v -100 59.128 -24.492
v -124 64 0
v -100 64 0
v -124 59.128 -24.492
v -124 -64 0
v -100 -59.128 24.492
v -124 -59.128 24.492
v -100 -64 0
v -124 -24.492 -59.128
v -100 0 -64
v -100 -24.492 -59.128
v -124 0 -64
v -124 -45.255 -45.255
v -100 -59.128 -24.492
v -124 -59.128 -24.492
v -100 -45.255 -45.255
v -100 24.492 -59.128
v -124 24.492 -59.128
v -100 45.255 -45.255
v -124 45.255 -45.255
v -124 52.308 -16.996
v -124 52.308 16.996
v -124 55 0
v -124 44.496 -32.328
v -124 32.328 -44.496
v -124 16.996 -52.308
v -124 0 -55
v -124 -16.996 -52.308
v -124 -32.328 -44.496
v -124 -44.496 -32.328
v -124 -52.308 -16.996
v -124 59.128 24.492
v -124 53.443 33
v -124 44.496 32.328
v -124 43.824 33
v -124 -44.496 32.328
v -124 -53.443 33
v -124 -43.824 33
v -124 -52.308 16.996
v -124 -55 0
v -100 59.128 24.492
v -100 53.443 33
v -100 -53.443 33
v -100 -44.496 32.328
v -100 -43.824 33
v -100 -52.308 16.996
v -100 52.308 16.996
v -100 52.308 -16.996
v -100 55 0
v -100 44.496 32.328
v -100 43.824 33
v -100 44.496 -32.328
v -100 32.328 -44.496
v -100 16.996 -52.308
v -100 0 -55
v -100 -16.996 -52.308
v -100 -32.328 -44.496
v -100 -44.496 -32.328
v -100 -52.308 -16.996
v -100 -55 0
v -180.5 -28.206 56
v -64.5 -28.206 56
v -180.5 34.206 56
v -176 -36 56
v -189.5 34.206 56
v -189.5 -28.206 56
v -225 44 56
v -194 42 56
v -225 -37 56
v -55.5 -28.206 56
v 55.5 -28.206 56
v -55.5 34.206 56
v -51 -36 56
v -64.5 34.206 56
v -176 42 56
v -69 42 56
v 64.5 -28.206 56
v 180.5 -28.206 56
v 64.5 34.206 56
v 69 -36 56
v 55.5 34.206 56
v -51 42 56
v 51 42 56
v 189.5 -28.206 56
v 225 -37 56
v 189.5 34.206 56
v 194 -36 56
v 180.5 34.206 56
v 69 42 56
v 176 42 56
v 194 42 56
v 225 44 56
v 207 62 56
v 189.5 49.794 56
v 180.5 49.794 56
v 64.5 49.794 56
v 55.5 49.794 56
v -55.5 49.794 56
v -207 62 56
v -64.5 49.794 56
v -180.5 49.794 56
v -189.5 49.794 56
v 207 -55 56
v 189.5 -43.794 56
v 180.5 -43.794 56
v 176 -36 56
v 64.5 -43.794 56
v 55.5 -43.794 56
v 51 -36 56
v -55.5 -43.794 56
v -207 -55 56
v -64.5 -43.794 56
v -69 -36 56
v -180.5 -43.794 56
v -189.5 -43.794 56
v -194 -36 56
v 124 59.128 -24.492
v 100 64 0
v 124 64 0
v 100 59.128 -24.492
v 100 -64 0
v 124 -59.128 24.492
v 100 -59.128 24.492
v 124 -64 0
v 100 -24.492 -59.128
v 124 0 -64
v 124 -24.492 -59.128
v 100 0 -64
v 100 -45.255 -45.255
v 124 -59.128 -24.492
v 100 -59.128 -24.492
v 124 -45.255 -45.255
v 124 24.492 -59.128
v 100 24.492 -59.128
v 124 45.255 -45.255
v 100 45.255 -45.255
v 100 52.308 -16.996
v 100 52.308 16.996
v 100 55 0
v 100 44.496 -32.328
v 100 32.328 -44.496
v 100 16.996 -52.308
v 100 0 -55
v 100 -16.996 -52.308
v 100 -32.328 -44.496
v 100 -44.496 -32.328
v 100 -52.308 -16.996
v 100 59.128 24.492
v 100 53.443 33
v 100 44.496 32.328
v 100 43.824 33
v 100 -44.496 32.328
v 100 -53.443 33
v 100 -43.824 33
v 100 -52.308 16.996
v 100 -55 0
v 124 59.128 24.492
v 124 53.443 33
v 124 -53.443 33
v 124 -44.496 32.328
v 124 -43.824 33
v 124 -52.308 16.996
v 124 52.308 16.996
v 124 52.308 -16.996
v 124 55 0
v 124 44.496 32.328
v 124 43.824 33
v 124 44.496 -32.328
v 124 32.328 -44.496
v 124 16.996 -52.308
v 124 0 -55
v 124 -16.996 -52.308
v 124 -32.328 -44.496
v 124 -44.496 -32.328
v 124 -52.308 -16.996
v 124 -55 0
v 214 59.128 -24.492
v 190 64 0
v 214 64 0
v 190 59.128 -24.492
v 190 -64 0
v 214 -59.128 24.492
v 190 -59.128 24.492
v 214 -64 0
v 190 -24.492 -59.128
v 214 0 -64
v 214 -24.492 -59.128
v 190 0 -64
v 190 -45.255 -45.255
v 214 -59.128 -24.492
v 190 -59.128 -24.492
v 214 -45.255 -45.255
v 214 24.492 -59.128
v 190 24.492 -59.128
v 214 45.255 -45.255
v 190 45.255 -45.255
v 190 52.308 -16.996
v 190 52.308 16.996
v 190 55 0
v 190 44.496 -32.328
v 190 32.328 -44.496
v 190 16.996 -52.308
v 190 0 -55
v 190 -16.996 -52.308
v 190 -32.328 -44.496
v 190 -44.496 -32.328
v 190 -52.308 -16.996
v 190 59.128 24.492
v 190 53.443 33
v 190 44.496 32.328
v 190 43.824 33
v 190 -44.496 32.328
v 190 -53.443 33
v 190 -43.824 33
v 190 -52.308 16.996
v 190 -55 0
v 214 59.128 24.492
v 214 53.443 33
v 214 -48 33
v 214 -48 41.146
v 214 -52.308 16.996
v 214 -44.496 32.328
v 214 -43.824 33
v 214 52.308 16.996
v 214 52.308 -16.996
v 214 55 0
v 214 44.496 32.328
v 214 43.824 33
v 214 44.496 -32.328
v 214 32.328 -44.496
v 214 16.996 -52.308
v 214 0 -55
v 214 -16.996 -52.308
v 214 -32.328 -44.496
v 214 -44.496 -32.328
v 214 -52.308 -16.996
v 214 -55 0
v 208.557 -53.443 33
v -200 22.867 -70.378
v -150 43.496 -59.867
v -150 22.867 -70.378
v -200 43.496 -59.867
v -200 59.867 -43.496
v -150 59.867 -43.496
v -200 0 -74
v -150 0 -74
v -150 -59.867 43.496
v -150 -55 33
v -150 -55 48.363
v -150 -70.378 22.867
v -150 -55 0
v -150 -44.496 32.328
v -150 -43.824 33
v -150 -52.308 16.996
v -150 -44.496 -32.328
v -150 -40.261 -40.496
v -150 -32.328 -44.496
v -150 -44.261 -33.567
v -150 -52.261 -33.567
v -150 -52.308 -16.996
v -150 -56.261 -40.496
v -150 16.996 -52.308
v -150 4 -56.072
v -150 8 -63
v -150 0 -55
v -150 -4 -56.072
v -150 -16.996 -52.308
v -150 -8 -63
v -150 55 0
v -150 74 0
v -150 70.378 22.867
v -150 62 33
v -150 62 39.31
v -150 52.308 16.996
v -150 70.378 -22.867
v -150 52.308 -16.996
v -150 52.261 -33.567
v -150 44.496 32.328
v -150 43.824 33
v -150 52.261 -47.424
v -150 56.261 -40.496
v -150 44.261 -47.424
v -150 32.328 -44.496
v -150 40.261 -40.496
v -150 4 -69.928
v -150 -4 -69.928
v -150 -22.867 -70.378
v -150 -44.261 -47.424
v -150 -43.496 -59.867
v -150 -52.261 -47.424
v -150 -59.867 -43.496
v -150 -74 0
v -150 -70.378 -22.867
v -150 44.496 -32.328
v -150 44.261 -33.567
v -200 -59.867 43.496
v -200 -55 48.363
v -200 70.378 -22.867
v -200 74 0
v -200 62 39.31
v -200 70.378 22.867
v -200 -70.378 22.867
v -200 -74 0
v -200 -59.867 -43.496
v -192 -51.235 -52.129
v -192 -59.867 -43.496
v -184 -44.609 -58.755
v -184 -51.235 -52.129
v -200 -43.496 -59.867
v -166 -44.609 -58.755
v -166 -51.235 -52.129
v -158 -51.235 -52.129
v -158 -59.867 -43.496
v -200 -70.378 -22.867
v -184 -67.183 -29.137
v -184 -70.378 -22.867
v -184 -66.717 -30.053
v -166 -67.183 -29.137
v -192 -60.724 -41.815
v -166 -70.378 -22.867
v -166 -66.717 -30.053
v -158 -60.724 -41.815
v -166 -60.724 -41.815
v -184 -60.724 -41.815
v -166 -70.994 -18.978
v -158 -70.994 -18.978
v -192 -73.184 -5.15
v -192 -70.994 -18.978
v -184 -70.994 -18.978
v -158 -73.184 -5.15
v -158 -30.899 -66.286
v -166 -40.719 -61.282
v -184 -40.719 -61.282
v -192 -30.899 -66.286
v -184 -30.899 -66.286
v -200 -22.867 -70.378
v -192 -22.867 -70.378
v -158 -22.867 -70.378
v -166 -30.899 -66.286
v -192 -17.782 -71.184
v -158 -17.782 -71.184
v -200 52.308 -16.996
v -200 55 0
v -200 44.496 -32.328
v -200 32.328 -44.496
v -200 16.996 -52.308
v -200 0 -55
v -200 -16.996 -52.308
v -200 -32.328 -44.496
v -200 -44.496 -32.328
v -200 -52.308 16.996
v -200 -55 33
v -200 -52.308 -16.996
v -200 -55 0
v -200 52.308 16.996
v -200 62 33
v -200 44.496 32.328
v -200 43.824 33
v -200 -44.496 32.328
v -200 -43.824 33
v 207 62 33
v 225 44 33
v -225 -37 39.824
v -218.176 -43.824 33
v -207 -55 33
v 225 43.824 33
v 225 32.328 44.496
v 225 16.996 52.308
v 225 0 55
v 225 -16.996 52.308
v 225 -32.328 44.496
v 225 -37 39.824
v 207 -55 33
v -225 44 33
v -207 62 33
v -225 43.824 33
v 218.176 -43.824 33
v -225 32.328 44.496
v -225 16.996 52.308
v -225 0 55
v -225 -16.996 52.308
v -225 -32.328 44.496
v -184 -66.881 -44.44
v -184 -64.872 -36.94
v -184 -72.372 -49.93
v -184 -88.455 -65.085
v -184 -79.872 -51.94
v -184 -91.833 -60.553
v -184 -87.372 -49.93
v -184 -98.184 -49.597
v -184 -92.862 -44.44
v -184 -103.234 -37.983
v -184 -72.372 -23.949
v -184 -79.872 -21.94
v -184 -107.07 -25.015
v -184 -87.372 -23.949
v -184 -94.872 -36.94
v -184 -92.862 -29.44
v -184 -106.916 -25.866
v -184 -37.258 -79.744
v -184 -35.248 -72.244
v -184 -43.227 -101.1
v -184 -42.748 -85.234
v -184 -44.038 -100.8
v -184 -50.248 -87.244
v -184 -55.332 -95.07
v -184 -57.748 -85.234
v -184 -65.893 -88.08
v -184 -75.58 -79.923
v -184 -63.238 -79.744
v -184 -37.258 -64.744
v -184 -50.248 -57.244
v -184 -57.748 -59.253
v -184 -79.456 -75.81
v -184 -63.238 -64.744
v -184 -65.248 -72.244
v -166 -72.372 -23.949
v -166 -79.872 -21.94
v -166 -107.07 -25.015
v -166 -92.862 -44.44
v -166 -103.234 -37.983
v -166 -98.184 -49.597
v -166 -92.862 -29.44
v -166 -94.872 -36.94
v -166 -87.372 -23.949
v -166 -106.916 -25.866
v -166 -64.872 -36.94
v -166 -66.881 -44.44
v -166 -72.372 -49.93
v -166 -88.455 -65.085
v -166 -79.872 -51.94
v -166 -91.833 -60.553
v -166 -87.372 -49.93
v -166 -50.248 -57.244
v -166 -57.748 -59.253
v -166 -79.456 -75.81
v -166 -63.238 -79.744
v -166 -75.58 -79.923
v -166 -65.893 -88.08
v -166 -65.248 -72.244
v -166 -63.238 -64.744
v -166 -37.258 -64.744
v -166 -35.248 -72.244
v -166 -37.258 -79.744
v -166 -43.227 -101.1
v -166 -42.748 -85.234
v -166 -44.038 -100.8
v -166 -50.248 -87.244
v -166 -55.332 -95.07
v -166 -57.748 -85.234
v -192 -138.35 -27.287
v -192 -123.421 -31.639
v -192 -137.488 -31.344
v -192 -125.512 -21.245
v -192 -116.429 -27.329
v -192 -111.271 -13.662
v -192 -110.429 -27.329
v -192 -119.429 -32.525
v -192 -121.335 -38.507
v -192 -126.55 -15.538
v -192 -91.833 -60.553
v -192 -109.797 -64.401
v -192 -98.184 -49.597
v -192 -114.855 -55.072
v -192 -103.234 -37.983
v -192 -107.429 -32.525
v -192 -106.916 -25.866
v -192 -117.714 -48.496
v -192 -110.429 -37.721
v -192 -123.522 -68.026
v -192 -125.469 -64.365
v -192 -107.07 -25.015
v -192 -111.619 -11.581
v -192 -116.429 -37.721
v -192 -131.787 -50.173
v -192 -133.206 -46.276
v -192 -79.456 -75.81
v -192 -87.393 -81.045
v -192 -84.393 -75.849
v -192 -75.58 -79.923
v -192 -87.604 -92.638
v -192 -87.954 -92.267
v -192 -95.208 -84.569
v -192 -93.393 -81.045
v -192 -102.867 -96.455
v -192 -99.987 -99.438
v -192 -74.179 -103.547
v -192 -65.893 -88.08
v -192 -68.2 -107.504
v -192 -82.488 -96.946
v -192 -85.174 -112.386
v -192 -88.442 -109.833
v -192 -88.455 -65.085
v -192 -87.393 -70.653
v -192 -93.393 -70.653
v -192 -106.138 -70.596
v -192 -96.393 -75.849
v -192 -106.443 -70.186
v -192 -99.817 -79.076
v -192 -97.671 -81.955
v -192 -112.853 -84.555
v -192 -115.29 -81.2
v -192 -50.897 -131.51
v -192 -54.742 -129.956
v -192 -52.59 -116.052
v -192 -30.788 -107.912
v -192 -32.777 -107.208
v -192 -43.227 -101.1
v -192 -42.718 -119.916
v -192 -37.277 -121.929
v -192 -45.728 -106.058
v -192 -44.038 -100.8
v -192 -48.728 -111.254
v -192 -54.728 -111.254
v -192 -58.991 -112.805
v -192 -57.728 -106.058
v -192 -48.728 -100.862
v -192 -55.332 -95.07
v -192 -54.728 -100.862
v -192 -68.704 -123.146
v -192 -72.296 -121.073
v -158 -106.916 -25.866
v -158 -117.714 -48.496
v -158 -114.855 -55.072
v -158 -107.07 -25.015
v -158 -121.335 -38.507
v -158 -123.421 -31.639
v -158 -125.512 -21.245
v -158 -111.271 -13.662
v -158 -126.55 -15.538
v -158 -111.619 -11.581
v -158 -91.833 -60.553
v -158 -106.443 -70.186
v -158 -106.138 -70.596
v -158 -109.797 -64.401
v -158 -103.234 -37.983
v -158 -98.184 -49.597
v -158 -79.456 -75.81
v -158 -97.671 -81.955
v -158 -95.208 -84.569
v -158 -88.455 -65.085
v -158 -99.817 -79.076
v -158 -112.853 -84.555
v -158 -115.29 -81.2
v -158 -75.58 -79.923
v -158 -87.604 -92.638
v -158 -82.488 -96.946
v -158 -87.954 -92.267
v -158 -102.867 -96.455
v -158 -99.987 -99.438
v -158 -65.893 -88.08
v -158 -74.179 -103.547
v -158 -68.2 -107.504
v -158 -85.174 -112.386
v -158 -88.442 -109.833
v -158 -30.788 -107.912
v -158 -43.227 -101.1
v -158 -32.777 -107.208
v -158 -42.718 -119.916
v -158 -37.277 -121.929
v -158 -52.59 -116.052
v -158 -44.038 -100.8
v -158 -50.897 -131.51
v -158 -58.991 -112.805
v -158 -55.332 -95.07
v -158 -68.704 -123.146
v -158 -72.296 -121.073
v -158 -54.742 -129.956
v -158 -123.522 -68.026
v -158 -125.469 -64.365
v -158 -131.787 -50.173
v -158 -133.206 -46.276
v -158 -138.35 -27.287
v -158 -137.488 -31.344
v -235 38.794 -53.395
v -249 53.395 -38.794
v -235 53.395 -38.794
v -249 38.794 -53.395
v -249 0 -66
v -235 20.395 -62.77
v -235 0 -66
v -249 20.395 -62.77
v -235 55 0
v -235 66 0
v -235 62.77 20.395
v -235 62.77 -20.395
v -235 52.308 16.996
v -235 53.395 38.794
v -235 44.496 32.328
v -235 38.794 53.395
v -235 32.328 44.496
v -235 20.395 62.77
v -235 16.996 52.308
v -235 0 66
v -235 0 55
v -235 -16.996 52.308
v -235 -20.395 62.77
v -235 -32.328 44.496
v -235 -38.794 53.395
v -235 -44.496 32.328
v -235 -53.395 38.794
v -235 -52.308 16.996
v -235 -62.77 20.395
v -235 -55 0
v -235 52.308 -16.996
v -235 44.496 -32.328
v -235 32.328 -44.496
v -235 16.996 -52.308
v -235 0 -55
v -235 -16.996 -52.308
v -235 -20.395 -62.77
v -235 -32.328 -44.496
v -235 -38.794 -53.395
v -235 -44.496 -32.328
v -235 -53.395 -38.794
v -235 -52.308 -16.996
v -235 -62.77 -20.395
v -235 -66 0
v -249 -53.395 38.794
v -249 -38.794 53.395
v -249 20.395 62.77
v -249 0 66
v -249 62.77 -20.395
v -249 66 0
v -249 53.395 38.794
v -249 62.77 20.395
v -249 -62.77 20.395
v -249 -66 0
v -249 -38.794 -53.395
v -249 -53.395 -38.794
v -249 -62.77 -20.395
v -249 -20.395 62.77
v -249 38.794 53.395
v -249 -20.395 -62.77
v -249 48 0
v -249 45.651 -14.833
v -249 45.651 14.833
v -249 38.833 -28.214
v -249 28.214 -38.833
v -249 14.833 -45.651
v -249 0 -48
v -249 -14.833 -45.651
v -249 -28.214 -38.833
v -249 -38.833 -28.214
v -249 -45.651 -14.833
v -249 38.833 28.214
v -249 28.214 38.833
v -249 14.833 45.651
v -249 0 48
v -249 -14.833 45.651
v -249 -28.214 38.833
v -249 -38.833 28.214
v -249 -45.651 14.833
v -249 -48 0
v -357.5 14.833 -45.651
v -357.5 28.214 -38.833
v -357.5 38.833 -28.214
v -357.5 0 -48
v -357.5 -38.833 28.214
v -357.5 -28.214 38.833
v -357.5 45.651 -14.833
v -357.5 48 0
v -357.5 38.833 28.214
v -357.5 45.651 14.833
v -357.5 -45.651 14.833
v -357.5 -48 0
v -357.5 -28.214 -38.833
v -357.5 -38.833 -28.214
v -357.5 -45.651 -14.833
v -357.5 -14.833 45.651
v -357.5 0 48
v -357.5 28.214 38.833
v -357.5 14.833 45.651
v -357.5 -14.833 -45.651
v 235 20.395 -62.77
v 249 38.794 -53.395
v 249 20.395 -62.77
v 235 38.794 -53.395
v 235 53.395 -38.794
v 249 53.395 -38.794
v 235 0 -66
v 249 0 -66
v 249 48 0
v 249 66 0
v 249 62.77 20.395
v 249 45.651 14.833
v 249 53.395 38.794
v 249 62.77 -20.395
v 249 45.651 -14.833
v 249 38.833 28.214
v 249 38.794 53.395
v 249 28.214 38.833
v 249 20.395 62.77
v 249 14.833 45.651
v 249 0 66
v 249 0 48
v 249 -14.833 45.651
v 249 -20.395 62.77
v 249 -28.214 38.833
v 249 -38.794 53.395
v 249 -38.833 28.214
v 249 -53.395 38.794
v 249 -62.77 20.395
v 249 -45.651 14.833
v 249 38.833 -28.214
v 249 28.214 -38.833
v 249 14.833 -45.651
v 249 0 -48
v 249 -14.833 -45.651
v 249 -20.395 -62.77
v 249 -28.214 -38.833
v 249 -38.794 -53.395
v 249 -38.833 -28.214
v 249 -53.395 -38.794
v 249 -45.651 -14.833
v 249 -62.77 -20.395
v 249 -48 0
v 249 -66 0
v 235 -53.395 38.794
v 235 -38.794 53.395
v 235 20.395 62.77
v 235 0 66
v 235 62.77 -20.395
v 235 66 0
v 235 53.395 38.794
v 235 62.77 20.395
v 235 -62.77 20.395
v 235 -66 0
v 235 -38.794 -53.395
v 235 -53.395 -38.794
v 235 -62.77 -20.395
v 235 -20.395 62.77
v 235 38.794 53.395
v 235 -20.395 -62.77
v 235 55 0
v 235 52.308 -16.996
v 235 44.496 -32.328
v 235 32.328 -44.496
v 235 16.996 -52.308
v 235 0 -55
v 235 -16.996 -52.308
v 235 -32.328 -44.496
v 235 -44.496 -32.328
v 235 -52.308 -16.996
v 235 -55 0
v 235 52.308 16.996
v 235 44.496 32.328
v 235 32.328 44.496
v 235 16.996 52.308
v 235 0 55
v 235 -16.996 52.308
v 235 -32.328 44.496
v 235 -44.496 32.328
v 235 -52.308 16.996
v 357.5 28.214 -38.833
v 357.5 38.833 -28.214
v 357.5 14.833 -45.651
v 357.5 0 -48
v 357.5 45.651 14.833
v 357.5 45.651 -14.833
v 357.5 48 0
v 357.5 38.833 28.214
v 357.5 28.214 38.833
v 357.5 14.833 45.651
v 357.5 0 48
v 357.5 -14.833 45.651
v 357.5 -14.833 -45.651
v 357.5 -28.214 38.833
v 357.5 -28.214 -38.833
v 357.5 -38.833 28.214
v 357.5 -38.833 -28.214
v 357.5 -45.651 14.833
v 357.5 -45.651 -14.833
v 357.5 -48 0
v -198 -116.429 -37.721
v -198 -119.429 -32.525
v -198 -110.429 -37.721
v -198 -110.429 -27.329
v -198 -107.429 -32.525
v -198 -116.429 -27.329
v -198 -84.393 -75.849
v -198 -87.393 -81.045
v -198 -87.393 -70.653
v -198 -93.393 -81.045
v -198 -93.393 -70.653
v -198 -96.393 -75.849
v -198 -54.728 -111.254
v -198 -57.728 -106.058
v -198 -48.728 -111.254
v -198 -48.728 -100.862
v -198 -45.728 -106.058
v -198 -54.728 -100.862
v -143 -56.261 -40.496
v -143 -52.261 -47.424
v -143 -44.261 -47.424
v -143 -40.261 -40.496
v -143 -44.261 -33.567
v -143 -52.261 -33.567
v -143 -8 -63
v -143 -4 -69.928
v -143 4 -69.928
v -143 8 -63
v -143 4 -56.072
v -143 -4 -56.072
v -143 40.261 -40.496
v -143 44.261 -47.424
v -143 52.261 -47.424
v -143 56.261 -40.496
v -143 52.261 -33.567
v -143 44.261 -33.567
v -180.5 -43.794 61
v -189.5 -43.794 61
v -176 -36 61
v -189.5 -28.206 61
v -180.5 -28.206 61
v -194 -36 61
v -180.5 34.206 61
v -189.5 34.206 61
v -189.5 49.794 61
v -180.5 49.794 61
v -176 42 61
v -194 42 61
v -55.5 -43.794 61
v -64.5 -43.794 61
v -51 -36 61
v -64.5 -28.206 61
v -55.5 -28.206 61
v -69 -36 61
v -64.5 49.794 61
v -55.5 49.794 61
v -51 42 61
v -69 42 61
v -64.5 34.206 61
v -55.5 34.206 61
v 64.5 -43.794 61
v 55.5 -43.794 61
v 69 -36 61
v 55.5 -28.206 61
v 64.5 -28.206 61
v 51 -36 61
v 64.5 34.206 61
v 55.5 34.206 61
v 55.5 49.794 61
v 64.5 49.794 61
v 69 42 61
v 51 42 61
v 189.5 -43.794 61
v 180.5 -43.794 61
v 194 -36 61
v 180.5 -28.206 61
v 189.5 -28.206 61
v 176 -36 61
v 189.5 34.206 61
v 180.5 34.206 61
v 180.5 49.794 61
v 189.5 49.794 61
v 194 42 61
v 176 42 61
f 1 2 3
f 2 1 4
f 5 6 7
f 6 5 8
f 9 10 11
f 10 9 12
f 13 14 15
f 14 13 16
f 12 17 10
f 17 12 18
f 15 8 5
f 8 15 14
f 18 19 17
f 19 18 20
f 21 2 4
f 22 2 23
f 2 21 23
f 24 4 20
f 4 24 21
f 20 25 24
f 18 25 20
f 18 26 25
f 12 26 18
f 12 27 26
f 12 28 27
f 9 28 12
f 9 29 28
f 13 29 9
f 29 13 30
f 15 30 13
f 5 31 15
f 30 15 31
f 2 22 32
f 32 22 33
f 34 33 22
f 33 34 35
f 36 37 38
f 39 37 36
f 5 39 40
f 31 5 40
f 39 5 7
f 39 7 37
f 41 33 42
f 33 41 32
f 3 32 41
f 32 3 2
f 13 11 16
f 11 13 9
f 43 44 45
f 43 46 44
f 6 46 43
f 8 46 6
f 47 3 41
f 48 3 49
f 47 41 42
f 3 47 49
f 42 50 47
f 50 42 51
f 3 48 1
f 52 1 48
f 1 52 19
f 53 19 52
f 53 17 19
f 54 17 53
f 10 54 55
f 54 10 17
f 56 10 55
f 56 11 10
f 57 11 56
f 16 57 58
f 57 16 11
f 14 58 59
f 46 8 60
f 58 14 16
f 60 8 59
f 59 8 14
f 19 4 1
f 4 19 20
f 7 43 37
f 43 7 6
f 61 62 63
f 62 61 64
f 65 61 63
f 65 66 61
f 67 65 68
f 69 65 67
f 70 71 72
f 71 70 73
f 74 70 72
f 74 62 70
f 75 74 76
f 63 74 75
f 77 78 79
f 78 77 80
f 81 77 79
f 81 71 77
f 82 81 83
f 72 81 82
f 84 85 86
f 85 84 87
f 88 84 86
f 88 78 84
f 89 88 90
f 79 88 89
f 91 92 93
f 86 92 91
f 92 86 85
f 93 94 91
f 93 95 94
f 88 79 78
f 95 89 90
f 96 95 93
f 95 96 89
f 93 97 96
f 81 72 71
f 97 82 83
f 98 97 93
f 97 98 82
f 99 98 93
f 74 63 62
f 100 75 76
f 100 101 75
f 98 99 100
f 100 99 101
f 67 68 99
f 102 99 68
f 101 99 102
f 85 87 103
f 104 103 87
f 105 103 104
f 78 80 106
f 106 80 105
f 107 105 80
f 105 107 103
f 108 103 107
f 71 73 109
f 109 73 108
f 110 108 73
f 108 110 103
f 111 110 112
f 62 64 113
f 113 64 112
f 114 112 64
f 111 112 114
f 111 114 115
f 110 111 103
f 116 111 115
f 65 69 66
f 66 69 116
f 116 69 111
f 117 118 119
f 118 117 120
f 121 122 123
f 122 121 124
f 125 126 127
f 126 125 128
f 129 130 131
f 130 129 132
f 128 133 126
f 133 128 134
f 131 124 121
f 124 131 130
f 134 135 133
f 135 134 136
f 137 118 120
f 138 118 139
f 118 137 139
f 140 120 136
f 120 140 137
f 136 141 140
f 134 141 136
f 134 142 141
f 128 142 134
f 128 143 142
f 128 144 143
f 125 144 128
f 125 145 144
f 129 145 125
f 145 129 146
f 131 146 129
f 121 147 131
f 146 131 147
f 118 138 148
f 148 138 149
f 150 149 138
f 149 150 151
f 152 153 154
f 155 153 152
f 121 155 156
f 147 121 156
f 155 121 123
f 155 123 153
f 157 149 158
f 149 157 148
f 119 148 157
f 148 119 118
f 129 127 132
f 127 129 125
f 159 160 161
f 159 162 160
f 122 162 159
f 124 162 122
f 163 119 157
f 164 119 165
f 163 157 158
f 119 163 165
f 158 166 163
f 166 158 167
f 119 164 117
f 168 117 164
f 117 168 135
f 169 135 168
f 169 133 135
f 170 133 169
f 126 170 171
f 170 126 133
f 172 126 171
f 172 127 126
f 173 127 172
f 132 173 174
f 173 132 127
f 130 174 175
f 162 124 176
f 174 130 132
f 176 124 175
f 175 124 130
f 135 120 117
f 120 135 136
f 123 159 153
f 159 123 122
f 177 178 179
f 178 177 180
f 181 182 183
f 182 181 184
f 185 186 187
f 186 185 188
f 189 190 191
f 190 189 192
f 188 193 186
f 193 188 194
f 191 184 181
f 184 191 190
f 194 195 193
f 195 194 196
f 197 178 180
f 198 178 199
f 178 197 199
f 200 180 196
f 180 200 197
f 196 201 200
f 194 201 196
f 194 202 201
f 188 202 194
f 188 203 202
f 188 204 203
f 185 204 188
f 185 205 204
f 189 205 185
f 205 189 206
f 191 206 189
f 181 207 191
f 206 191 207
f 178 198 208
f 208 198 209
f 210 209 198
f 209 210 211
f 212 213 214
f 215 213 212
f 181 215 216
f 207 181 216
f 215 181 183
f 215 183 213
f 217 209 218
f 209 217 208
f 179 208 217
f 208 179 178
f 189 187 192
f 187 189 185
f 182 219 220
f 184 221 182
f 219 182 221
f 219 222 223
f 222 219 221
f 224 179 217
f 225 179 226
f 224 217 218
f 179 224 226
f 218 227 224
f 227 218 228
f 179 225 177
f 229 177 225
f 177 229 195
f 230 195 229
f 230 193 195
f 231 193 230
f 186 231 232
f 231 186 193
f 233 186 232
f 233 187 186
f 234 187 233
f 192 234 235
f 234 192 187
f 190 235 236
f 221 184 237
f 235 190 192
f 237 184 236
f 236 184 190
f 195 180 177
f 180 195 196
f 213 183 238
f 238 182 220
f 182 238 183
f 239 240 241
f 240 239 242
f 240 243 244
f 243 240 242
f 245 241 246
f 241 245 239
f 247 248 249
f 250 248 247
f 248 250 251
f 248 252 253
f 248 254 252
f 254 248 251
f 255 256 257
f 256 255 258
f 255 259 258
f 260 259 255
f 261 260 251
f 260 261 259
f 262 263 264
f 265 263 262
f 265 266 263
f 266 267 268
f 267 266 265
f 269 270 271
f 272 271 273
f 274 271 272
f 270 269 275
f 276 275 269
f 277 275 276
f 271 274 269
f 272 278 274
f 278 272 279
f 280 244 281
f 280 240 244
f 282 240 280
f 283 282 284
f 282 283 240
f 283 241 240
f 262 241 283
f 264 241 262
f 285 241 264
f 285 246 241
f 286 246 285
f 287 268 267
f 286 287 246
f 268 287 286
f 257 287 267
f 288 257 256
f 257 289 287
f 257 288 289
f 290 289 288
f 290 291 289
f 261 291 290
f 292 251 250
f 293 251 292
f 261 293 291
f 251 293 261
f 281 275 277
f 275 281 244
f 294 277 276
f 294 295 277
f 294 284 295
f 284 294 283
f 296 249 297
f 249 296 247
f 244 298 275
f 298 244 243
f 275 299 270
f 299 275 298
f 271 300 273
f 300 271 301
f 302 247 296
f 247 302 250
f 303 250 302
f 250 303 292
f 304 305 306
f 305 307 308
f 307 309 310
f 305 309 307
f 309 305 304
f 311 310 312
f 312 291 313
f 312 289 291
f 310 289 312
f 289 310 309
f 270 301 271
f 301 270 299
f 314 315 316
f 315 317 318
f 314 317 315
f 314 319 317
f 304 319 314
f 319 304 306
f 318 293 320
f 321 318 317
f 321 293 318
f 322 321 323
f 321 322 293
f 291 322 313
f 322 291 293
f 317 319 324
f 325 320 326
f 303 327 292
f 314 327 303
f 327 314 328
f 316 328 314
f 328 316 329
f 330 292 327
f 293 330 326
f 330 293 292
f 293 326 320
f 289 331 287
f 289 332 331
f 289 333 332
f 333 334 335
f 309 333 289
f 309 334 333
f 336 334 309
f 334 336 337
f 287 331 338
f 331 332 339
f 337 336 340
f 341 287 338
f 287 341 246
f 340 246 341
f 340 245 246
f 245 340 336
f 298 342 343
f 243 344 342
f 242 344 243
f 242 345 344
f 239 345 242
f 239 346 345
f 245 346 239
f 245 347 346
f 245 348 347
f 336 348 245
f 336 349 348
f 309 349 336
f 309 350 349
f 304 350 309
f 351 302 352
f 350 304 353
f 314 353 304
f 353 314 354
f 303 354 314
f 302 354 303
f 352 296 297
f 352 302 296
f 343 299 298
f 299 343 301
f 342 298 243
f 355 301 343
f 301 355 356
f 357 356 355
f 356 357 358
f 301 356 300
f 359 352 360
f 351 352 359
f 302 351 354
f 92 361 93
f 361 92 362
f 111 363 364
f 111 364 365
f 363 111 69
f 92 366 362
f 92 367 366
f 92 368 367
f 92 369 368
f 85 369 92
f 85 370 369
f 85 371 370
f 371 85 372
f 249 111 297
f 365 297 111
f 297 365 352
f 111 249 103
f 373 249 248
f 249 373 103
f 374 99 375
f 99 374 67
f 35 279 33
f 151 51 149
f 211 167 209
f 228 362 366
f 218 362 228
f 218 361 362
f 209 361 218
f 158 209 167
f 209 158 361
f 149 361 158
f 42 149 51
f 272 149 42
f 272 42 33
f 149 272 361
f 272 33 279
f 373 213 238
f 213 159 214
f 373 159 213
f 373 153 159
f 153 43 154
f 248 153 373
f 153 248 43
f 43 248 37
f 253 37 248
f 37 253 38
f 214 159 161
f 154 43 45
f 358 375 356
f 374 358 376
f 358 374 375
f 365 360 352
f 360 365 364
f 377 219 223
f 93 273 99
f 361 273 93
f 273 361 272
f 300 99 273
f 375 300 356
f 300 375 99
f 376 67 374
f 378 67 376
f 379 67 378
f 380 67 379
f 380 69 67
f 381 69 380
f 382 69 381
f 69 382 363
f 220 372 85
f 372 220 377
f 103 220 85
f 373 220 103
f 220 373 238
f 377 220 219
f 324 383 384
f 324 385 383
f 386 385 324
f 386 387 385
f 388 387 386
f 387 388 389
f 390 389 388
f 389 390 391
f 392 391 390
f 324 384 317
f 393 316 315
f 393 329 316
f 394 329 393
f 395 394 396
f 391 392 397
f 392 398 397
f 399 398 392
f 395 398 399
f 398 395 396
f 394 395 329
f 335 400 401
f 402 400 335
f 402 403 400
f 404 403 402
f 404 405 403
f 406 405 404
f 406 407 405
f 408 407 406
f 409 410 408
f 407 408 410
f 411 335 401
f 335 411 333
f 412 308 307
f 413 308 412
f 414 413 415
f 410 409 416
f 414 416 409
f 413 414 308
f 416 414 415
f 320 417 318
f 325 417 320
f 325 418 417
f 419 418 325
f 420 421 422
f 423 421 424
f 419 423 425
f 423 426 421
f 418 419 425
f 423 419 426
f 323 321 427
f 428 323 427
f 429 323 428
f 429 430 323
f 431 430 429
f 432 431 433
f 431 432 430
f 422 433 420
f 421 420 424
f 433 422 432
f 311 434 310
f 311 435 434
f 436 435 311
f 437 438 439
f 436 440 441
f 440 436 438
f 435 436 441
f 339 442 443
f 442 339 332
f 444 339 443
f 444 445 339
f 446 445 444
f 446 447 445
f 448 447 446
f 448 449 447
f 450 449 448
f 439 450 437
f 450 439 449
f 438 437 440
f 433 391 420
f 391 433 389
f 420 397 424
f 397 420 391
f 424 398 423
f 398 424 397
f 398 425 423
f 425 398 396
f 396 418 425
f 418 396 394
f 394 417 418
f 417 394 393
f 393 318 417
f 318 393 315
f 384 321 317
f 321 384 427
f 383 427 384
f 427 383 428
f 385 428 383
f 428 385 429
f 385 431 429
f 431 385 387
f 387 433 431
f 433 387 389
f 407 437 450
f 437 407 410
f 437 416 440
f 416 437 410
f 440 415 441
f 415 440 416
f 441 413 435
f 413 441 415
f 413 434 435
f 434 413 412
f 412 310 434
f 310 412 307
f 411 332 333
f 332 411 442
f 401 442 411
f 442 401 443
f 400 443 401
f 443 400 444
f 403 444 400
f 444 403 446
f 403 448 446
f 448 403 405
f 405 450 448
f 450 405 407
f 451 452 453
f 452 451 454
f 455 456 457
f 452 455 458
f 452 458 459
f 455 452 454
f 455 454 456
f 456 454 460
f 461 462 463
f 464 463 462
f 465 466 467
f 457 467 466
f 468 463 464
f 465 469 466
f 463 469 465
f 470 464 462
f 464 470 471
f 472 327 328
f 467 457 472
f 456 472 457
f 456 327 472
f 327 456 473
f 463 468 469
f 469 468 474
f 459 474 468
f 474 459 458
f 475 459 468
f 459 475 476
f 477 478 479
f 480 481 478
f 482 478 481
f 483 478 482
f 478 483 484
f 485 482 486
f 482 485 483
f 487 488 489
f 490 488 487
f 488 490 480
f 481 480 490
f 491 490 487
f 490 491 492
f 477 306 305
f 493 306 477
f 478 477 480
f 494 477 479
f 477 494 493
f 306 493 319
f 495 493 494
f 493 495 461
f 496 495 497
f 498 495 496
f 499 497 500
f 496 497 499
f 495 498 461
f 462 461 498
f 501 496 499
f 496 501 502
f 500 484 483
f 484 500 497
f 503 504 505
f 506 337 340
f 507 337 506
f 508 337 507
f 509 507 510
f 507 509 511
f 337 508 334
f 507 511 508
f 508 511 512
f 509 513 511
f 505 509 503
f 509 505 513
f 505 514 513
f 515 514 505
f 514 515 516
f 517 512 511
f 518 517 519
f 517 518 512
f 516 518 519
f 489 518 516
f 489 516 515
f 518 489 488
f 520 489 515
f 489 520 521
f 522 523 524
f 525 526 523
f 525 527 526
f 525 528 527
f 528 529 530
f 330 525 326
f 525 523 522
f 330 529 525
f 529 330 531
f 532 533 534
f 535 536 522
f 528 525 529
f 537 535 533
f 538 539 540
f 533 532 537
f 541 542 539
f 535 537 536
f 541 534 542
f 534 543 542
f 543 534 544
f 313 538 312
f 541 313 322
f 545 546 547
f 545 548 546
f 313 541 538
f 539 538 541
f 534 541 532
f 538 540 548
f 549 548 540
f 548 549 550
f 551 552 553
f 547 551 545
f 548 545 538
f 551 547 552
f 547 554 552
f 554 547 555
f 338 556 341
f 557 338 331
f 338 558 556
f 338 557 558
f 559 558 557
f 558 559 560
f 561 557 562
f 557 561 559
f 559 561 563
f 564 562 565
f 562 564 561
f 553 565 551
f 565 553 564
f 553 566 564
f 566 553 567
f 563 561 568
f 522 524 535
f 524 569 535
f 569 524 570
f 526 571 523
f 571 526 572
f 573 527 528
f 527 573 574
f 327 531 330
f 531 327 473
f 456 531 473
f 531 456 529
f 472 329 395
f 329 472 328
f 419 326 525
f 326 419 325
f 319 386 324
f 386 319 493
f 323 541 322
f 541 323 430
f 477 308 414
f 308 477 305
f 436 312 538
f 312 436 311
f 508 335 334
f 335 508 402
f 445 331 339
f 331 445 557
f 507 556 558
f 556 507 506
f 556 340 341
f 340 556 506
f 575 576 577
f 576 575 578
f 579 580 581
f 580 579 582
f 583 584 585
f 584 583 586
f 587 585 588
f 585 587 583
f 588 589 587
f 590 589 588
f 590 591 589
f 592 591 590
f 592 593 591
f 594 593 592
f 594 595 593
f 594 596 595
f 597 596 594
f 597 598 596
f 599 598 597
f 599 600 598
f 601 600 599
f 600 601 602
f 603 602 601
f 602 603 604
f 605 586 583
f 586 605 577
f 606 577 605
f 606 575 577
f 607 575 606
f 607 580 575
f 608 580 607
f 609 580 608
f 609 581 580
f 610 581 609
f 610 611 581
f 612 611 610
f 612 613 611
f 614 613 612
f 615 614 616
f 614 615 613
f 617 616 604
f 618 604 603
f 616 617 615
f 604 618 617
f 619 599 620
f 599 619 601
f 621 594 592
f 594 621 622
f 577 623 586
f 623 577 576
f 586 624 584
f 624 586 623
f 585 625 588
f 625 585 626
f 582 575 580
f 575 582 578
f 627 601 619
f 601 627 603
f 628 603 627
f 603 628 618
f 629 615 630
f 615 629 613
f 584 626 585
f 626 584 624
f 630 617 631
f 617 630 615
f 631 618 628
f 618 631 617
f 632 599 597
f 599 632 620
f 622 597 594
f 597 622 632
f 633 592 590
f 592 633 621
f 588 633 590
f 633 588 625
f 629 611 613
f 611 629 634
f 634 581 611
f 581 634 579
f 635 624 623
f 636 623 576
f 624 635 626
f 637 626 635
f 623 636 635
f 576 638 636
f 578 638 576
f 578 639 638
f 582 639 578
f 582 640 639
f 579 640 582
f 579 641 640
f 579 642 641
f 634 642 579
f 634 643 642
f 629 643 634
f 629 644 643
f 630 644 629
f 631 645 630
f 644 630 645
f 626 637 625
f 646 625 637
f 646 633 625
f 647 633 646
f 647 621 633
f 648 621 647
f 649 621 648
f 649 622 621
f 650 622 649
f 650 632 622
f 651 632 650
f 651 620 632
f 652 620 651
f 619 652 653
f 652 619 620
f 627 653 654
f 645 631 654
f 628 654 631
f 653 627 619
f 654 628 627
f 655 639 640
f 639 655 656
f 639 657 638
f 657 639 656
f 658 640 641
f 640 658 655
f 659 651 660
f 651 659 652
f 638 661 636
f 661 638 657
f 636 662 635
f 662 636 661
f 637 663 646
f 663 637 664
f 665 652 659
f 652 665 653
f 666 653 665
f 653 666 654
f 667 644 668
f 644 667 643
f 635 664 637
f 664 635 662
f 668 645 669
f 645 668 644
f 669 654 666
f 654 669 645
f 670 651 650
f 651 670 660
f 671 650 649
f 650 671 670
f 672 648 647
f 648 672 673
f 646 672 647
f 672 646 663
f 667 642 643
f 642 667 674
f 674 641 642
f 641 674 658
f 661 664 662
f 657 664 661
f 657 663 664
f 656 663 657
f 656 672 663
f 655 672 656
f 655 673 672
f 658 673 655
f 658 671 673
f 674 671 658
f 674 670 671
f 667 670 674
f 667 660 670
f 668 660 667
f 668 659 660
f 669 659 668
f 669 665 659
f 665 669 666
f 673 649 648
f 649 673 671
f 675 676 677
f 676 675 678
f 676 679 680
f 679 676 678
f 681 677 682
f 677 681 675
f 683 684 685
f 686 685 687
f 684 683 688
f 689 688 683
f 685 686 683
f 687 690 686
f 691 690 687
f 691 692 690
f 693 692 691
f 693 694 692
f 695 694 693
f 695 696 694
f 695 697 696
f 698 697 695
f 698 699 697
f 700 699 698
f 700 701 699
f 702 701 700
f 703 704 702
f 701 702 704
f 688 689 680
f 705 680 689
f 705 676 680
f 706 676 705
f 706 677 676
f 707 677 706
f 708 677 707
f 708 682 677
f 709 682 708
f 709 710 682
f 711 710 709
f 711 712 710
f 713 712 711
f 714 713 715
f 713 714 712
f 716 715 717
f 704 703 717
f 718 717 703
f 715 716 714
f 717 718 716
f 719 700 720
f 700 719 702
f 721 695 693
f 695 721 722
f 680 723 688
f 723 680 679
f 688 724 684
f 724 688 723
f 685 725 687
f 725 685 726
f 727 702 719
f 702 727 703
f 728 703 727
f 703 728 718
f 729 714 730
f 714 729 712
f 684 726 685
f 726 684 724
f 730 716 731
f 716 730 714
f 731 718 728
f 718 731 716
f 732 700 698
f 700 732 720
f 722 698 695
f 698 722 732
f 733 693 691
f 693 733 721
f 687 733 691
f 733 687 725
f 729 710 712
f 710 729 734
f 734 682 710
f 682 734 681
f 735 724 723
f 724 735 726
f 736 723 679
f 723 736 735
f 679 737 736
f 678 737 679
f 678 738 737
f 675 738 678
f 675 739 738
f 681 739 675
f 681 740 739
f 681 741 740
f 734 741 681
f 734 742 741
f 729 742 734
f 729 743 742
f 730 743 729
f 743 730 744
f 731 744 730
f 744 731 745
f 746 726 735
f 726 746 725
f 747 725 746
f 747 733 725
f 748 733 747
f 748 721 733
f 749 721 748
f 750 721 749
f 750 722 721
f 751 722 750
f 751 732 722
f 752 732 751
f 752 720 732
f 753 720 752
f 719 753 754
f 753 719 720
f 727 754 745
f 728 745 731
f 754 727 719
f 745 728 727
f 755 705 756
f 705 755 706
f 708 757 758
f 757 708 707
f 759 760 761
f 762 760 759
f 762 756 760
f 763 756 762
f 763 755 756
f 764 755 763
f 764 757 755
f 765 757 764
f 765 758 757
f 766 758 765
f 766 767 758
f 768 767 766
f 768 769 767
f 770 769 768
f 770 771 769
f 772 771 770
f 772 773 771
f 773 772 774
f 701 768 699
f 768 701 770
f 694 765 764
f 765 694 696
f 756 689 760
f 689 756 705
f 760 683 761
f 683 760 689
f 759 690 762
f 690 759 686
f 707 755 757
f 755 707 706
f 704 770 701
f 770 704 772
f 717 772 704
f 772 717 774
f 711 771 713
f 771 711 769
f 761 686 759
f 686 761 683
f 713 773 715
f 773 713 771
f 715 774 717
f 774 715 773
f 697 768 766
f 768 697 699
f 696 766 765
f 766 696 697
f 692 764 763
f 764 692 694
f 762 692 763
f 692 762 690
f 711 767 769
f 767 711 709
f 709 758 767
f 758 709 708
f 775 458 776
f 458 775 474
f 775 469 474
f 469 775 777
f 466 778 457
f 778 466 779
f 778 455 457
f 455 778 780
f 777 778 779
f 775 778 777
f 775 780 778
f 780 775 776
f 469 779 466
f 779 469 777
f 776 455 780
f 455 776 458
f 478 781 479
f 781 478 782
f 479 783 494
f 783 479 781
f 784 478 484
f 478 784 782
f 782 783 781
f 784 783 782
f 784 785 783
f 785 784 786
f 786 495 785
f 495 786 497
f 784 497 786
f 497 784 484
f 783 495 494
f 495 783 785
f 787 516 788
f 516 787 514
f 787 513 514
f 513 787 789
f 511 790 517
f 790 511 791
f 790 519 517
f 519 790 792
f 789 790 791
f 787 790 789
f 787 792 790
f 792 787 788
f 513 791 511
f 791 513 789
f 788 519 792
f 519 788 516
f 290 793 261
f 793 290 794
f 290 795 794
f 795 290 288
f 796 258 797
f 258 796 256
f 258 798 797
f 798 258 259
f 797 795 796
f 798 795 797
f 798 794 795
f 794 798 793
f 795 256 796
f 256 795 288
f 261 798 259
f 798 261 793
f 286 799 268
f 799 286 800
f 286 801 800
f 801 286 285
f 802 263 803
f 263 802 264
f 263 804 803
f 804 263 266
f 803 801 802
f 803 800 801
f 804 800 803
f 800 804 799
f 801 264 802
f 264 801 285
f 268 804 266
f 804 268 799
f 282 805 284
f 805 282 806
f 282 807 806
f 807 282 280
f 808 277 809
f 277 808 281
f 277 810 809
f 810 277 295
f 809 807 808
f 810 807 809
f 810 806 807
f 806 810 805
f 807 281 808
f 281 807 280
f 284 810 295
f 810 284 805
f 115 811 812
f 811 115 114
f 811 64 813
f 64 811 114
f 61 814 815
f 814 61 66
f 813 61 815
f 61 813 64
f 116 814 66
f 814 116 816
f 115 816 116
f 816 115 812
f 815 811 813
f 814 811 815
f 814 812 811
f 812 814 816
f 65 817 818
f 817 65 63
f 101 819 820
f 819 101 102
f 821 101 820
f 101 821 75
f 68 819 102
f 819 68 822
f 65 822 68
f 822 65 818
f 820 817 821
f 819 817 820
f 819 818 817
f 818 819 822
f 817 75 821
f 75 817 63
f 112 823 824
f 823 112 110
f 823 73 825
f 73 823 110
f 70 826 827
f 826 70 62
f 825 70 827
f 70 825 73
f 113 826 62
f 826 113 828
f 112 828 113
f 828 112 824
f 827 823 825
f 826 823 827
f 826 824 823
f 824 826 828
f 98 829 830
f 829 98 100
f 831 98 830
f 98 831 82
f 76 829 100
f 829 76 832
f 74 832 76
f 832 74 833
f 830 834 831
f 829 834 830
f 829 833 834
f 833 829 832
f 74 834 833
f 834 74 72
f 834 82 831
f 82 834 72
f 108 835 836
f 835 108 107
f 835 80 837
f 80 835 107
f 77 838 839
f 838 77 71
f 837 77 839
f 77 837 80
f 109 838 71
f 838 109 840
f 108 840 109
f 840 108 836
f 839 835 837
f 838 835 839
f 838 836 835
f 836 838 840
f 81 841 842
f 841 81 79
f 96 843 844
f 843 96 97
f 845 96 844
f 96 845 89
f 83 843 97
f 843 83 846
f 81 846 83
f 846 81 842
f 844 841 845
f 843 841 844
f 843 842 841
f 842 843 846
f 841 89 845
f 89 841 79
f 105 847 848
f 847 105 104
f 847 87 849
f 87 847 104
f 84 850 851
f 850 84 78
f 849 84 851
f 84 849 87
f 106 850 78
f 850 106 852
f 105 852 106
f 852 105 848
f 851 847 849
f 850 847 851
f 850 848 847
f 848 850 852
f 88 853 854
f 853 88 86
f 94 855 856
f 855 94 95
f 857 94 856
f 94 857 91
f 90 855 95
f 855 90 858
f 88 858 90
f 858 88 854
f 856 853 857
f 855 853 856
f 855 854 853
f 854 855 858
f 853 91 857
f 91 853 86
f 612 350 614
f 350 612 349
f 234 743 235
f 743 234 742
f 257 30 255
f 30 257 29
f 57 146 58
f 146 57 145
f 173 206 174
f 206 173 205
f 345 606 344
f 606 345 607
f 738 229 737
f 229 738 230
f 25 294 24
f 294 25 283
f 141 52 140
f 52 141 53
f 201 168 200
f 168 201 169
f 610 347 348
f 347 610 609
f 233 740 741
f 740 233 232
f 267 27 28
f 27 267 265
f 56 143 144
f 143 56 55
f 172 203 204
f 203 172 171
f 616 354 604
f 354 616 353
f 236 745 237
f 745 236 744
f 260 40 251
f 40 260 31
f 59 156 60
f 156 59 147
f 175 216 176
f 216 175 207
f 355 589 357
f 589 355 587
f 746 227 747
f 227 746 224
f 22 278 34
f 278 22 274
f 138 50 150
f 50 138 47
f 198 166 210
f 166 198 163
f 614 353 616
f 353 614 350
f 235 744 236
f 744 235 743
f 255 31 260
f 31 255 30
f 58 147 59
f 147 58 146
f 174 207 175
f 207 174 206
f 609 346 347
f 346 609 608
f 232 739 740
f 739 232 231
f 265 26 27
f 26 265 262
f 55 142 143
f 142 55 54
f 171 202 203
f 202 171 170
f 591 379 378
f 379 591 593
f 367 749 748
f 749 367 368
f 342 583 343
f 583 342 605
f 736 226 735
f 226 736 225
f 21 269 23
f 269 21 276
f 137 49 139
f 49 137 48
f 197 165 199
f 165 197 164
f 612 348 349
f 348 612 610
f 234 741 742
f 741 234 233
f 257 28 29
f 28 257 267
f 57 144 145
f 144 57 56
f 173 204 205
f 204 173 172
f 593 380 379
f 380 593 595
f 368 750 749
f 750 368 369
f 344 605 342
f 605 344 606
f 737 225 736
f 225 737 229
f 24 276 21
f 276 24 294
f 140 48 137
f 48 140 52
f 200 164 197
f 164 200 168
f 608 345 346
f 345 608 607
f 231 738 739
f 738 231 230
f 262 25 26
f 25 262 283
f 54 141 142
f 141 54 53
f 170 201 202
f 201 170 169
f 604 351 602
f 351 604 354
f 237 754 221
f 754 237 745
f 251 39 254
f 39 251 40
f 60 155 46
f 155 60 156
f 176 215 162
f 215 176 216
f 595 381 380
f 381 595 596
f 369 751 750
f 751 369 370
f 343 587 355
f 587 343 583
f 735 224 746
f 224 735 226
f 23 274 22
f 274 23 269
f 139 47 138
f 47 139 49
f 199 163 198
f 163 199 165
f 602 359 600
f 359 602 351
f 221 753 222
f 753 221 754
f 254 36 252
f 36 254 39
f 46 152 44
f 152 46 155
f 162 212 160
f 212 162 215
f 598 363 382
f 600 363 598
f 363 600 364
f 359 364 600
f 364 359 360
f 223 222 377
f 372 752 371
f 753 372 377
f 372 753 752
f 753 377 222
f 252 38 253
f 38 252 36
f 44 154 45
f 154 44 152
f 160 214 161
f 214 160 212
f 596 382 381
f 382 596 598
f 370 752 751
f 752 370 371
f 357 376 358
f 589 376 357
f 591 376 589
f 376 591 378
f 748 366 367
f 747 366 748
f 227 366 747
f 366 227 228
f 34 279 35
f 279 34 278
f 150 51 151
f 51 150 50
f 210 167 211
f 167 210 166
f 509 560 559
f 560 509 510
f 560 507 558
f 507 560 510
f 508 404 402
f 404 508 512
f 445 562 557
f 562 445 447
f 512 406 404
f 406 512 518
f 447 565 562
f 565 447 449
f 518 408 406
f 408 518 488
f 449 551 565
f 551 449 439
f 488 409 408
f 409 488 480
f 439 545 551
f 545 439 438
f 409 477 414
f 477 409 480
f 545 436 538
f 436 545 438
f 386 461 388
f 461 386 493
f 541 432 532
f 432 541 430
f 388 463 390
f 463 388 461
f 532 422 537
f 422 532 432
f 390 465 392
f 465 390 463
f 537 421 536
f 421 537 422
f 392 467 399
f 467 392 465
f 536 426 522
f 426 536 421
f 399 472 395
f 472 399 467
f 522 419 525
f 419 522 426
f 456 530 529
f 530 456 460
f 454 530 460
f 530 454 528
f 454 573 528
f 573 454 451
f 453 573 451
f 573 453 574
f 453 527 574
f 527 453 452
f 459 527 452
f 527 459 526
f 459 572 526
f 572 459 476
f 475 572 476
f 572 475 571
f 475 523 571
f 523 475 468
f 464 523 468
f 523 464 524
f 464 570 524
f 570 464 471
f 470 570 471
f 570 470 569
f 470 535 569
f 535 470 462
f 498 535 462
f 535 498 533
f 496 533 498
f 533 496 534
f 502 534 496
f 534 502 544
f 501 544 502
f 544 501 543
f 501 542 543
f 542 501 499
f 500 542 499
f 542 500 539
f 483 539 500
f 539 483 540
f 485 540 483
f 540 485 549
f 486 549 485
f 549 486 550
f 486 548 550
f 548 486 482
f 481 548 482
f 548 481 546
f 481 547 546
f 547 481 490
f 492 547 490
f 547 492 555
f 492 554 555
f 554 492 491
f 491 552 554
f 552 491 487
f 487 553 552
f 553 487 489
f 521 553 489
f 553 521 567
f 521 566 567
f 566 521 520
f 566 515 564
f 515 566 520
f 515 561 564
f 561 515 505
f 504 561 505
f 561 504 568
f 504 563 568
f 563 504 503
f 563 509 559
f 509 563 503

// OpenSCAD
// Heavy Trunnion Mount - MOVING group (on the trunnions; tilts about X with elevation).
// Export: openscad.com -o heavy-trunnion-moving.stl heavy-trunnion-moving.scad
// Per material: -D m=1 (cast) | 2 (steel). Units mm, see heavy-trunnion-lib.scad.
include <heavy-trunnion-lib.scad>
m = 0;
group_moving(["all", "cast", "steel"][m]);
